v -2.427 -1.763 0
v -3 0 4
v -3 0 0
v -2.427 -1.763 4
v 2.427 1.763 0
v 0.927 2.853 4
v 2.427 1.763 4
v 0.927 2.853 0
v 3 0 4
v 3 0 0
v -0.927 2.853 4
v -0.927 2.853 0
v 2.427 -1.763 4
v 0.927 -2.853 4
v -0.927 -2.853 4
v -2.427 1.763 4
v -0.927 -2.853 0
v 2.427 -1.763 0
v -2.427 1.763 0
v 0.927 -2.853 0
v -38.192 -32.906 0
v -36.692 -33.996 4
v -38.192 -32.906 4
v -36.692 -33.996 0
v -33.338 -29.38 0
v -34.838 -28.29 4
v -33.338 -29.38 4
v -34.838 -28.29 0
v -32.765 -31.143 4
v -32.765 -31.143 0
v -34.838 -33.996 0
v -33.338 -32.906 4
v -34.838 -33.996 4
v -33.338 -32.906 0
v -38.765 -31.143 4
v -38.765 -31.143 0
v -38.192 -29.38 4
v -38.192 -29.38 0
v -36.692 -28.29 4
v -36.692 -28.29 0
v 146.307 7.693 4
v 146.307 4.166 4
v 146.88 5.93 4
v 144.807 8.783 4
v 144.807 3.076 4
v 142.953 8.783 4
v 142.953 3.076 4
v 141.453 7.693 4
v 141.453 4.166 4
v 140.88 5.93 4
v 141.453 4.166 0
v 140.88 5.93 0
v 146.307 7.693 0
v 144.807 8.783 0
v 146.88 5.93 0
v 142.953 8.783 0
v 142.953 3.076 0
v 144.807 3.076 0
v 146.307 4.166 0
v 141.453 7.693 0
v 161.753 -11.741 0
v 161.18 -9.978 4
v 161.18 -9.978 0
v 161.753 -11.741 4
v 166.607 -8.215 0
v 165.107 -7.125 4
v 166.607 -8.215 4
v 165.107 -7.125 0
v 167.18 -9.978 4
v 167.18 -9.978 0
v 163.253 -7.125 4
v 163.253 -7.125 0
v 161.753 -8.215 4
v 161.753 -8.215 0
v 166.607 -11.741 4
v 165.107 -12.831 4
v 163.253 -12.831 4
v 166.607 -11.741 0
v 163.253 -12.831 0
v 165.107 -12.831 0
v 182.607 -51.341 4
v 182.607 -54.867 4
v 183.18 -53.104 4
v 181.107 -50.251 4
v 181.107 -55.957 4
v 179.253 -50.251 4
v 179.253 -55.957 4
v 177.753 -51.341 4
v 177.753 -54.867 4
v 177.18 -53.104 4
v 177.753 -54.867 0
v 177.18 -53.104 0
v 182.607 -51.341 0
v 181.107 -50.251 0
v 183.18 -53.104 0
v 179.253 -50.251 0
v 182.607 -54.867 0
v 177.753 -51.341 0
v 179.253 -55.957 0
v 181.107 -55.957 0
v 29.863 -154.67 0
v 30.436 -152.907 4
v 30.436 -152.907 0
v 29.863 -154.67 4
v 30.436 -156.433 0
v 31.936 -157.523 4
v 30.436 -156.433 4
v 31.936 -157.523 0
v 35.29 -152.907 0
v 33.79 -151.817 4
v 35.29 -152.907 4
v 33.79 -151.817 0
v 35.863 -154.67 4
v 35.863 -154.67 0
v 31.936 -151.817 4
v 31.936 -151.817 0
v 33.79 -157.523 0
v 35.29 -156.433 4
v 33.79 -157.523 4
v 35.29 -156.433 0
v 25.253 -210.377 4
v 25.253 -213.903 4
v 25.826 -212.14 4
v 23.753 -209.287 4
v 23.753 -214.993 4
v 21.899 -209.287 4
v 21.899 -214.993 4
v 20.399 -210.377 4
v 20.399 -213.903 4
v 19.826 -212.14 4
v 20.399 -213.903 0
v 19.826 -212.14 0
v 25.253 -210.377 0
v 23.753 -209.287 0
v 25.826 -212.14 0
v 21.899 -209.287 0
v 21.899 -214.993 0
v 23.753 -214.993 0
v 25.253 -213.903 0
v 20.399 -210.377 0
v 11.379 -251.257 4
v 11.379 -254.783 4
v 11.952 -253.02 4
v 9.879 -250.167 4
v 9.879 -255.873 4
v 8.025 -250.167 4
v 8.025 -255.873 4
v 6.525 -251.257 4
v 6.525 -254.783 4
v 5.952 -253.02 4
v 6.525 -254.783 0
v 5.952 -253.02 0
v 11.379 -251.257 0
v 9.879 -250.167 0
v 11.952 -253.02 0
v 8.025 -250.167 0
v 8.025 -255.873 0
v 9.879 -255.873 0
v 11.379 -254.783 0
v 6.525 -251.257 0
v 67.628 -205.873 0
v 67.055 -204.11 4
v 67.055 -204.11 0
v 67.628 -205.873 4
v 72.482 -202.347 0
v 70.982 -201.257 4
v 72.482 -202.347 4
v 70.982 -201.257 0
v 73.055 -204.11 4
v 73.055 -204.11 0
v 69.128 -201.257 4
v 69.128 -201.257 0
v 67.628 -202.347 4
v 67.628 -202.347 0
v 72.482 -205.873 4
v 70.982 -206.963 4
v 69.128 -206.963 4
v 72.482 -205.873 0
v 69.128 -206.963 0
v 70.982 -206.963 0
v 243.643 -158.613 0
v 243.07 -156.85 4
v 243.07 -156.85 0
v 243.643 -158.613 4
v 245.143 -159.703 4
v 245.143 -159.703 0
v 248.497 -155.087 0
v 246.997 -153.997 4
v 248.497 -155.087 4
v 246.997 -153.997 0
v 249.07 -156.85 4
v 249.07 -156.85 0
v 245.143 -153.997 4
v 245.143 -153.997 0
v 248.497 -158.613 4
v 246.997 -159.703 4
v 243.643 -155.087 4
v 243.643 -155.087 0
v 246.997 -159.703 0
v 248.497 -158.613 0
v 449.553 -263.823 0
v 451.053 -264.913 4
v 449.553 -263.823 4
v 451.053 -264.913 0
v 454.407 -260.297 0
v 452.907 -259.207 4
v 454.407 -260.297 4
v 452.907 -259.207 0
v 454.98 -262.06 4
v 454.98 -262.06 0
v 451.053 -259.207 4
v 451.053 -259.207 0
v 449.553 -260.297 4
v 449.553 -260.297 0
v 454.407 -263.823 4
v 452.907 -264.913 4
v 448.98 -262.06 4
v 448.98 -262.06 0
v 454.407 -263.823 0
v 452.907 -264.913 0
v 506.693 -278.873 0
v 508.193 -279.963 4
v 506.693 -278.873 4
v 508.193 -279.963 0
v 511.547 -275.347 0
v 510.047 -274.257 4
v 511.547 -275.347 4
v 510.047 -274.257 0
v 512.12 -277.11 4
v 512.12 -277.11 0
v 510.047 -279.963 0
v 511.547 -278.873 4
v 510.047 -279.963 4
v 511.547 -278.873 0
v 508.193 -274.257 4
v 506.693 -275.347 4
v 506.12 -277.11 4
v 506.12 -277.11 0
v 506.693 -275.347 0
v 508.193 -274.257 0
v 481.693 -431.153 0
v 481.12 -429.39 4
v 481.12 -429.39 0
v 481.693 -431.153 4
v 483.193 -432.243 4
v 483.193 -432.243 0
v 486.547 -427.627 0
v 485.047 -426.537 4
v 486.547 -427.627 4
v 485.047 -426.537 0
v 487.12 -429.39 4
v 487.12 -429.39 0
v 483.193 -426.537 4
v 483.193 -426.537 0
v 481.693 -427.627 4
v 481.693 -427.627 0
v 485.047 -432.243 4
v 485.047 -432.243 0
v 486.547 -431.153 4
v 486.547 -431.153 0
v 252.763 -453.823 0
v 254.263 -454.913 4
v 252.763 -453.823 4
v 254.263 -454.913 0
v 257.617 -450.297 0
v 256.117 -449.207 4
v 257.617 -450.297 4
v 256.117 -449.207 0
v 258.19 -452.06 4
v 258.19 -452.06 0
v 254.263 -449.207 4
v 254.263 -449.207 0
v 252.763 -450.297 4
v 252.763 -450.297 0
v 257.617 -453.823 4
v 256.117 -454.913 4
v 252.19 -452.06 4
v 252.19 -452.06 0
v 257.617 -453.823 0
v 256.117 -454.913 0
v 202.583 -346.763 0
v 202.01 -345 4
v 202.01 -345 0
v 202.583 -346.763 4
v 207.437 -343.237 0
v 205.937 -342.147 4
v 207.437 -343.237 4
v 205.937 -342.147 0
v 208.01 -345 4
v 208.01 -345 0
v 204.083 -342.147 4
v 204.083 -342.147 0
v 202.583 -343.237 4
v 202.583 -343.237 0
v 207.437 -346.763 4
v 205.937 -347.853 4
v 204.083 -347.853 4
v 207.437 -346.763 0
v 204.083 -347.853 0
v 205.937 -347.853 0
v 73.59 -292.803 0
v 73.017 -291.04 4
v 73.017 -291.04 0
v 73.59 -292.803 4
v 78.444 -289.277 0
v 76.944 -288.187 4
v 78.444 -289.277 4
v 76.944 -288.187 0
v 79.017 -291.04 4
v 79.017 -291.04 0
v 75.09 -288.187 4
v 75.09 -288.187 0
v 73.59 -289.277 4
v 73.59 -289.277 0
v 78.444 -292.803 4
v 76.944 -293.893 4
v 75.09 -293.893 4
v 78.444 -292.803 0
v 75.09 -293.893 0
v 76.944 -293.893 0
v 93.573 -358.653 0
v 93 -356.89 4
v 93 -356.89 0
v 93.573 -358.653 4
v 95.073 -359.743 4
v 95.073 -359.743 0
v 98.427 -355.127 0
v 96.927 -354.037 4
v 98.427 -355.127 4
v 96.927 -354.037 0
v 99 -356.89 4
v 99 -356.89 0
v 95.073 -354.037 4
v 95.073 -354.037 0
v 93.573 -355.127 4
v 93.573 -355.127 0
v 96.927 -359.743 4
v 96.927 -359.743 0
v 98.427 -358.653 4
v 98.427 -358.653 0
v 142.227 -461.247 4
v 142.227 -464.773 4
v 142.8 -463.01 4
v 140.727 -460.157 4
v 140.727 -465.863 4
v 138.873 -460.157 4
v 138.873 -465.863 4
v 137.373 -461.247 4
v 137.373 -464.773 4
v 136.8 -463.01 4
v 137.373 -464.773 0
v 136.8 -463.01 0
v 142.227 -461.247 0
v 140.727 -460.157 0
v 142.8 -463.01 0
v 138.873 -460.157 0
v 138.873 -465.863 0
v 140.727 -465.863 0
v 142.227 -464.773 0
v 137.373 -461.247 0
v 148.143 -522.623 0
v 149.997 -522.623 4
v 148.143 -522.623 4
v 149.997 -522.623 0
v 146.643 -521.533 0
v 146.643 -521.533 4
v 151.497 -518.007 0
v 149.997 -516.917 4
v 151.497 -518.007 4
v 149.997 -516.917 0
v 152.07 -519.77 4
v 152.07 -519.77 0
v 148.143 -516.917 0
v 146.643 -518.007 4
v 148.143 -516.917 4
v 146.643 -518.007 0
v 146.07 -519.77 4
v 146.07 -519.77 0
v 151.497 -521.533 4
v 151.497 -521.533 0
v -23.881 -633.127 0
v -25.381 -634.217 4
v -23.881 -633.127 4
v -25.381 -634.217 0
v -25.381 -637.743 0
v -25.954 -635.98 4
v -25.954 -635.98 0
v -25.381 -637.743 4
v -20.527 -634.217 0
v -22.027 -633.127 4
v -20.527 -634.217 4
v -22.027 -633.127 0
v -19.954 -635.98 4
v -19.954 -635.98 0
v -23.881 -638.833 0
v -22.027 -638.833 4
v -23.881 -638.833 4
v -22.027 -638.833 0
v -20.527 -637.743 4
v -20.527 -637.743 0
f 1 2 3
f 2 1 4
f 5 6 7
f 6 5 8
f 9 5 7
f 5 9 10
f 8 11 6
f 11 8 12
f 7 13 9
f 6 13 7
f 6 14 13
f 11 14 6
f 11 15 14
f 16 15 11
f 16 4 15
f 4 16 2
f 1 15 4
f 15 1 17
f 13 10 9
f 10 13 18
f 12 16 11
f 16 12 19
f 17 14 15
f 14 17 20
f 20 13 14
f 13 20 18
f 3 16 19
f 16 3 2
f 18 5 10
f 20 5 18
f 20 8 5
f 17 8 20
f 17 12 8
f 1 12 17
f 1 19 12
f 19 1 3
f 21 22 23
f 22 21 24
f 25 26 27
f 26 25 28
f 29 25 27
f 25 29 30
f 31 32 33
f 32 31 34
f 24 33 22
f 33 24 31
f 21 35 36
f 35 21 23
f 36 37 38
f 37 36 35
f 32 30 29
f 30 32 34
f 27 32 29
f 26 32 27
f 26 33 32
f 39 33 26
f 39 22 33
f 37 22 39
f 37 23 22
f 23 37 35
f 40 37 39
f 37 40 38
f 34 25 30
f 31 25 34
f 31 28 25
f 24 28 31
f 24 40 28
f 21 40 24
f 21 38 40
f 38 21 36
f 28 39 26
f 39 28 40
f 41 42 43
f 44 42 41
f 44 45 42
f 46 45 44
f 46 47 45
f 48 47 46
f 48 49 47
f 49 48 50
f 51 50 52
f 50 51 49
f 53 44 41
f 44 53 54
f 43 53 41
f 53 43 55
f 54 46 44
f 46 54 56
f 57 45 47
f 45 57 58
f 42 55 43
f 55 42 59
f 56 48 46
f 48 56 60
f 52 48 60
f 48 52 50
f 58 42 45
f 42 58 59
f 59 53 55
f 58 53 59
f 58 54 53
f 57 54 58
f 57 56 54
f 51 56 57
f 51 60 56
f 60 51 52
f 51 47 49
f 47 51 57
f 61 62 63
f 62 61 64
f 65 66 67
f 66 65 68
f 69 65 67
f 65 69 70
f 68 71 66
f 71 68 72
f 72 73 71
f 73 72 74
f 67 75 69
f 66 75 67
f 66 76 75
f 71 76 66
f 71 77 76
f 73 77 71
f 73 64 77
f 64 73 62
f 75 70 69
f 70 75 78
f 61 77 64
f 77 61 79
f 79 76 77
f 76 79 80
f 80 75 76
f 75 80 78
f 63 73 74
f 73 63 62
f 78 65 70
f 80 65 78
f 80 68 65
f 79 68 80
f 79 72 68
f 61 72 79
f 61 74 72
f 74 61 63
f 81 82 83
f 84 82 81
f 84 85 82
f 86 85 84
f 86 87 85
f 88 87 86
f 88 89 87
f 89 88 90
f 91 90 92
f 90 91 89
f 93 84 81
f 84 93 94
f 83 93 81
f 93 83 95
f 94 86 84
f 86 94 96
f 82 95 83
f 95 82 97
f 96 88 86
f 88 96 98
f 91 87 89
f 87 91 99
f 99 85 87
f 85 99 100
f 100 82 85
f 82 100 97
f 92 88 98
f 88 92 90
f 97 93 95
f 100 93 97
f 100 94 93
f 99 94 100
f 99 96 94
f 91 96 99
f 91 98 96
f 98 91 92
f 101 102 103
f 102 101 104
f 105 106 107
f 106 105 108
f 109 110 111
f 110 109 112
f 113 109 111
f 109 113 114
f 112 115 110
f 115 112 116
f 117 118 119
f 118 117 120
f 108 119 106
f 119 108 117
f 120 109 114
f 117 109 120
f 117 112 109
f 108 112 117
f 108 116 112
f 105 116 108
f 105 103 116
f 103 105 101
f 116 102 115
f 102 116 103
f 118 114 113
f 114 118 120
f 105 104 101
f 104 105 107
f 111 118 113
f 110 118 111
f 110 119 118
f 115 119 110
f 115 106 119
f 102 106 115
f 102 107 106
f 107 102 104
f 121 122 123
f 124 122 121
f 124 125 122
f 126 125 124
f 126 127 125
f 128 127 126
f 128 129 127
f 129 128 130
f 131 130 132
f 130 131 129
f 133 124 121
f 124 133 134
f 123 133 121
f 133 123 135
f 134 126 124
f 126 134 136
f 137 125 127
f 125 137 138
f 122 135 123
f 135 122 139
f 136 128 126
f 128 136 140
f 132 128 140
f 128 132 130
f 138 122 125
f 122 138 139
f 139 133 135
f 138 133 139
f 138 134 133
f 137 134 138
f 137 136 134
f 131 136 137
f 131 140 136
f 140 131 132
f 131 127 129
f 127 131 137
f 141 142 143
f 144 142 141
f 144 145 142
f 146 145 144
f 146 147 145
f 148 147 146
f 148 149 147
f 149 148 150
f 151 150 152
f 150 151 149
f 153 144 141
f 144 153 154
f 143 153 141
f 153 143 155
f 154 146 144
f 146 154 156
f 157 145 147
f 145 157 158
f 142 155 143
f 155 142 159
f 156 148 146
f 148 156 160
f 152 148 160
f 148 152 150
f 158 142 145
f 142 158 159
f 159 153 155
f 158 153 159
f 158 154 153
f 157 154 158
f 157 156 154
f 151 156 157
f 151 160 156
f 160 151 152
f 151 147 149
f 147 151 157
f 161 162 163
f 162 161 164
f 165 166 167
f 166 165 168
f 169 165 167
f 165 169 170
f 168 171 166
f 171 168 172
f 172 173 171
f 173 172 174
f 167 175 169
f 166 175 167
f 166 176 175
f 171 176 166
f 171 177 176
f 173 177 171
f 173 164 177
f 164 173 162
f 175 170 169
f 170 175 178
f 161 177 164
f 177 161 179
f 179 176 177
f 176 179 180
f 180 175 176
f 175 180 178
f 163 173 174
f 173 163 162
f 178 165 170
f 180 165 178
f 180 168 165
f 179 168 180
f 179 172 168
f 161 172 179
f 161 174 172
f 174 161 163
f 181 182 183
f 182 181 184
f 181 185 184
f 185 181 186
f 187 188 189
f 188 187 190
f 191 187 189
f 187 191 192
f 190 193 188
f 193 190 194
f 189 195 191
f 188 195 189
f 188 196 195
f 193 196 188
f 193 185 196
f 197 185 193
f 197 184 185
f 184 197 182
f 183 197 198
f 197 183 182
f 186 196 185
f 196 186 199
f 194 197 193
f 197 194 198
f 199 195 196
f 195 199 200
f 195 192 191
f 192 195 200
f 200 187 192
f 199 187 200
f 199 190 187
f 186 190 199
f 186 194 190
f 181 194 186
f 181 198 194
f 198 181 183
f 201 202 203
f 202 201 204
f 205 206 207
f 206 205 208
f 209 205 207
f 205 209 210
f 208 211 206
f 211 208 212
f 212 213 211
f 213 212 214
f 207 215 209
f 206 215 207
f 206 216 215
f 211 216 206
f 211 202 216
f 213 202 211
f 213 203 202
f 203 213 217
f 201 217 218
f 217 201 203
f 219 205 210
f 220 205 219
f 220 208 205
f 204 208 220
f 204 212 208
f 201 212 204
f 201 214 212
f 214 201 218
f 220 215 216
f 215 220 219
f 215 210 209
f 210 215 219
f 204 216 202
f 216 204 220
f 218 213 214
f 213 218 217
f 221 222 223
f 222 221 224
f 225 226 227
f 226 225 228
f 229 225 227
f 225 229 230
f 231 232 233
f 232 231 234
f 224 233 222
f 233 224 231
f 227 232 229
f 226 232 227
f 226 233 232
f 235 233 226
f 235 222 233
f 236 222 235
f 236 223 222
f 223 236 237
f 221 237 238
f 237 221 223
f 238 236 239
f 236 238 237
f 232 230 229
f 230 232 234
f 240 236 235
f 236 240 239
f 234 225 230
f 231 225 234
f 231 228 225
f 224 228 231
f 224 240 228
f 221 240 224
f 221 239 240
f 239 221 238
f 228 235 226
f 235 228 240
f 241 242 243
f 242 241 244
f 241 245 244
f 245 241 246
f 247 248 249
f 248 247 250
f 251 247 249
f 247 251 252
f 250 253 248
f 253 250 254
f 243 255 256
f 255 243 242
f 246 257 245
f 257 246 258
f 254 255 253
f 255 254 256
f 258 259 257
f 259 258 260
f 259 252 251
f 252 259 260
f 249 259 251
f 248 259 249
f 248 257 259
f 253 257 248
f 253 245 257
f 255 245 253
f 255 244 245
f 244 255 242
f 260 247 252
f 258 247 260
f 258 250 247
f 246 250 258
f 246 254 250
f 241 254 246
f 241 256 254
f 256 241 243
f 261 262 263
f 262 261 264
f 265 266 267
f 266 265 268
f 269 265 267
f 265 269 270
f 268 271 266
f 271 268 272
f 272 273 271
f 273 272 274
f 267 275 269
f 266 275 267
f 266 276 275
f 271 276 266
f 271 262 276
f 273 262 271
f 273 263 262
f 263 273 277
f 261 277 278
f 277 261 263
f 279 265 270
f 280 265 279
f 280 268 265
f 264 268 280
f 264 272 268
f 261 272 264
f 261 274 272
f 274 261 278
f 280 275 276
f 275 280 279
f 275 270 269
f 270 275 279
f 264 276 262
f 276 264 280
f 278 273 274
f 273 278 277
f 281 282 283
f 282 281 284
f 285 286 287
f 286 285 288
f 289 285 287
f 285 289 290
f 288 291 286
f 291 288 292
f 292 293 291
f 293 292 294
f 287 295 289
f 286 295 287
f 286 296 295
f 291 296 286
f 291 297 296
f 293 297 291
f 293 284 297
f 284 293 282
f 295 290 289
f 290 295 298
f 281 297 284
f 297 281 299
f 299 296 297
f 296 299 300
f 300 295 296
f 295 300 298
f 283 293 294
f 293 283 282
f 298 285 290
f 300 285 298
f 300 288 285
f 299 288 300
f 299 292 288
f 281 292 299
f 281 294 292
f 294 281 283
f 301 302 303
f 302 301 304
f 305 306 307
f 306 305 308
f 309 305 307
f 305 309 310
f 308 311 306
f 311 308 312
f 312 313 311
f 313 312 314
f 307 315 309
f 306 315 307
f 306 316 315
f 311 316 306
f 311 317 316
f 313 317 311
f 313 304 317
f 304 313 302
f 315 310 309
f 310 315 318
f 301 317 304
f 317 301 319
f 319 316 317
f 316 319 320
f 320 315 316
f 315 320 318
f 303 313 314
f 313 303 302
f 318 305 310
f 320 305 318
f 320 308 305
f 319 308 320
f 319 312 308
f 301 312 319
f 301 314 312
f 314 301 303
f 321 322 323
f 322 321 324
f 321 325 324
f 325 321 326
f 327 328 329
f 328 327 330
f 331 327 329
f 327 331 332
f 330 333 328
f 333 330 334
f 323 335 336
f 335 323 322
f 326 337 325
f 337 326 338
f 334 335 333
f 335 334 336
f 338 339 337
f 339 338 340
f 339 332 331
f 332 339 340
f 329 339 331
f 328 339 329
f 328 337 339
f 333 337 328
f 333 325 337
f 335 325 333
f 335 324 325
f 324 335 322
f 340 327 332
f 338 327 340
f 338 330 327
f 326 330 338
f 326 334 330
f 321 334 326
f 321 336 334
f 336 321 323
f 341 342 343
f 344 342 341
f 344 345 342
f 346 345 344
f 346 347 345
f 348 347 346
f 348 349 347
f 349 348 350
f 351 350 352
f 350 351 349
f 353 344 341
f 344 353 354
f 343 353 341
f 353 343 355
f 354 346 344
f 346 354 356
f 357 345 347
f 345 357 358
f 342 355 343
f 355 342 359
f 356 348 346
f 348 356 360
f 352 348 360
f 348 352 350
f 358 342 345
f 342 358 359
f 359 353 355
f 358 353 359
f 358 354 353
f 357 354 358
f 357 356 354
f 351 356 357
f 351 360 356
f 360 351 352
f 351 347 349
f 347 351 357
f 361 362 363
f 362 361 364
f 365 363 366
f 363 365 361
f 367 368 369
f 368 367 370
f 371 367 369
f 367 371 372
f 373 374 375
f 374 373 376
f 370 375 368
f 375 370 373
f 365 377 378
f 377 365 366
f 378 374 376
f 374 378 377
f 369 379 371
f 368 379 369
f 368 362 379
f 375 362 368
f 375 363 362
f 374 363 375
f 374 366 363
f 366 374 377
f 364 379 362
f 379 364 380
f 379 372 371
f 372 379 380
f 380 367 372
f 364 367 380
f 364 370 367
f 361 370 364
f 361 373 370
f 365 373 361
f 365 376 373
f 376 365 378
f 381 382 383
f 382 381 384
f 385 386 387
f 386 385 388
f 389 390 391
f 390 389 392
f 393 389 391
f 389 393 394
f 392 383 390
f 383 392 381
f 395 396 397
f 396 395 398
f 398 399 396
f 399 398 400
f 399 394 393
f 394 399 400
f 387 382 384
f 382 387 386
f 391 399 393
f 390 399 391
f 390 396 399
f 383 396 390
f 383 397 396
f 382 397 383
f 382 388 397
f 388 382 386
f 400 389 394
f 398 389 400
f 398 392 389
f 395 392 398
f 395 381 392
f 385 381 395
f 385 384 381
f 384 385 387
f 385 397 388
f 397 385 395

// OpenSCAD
module manhattan45voronoi(points, infinity=100, gap_size=1) 
{
	t = gap_size/2;
	s = t*tan(22.5);

	for(p0 = points)	//each point
	{
		translate(p0)
		intersection_for(p1 = points)	//check every neighbor
		{
			v = p1-p0;	//vector from p0 to p1
			mp = v/2;	//mid-point
			narrow2 = min([abs(mp[0]),abs(mp[1])]);	//half the narrower side
			ne = mp + [ narrow2	, narrow2];
			nw = mp + [-narrow2	, narrow2];
			sw = mp + [-narrow2	,-narrow2];
			se = mp + [ narrow2	,-narrow2];
			/*	-->  <	narrow2
				nw  ne
				  mp
				sw  se
				>  <--	narrow2
			 */
			//Lee 1980 Two-Dimensional Voronoi Diagrams in the Lp-Metric (Figure1)
			if		(mp[0]==0 &&	mp[1]==0)	//pts same
			{
			}
			else if	(mp[0] >0 &&	mp[1]==0)	//along x+
			{
				polygon([	[-infinity, infinity],
							[mp[0] - t, infinity],
							[mp[0] - t,-infinity],
							[-infinity,-infinity]]);
			}
			else if	(mp[0] >0 &&	mp[1] >0 &&	abs(mp[0]) >abs(mp[1]))	//octant 1
			{
				polygon([	//clockwise
					[se[0] - t,se[1] - s],
					[se[0] - t,-infinity],
					[-infinity,-infinity],
					[-infinity, infinity],
					[nw[0] - t, infinity],
					[nw[0] - t,nw[1] - s]
				]);
			}
			else if	(mp[0] >0 &&	mp[1] >0 &&	abs(mp[0])==abs(mp[1]))	//diag  NE
			{
				translate(mp)	rotate([0,0, 45])	translate([-infinity,-infinity])
					square([infinity-t,infinity*2]);
			}
			else if	(mp[0] >0 &&	mp[1] >0 &&	abs(mp[0])< abs(mp[1]))	//octant 2
			{
				polygon([	//clockwise
					[se[0] - s,se[1] - t],
					[ infinity,se[1] - t],
					[ infinity,-infinity],
					[-infinity,-infinity],
					[-infinity,nw[1] - t],
					[nw[0] - s,nw[1] - t]
				]);
			}
			else if	(mp[0]==0 &&	mp[1] >0)	//along y+
			{
				polygon([	[-infinity,mp[1] - t],
							[ infinity,mp[1] - t],
							[ infinity,-infinity],
							[-infinity,-infinity]]);
			}
			else if	(mp[0]< 0 &&	mp[1] >0 &&	abs(mp[0])< abs(mp[1]))	//octant 3
			{
				polygon([	//clockwise
					[ne[0] + s,ne[1] - t],
					[ infinity,ne[1] - t],
					[ infinity,-infinity],
					[-infinity,-infinity],
					[-infinity,sw[1] - t],
					[sw[0] + s,sw[1] - t]
				]);
			}
			else if	(mp[0]< 0 &&	mp[1] >0 &&	abs(mp[0])==abs(mp[1]))	//diag  NW
			{
				translate(mp)	rotate([0,0,135])	translate([-infinity,-infinity])
					square([infinity-t,infinity*2]);
			}
			else if	(mp[0]< 0 &&	mp[1] >0 &&	abs(mp[0]) >abs(mp[1]))	//octant 4
			{
				polygon([	//clockwise
					[ne[0] + t,ne[1] - s],
					[ne[0] + t, infinity],
					[ infinity, infinity],
					[ infinity,-infinity],
					[sw[0] + t,-infinity],
					[sw[0] + t,sw[1] - s]
				]);
			}
			else if	(mp[0]< 0 &&	mp[1]==0)	//along x-
			{
				polygon([	[ infinity,-infinity],
							[mp[0] + t,-infinity],
							[mp[0] + t, infinity],
							[ infinity, infinity]]);
			}
			else if	(mp[0]< 0 &&	mp[1]< 0 &&	abs(mp[0]) >abs(mp[1]))	//octant 5
			{
				polygon([	//clockwise
					[nw[0] + t,nw[1] + s],
					[nw[0] + t, infinity],
					[ infinity, infinity],
					[ infinity,-infinity],
					[se[0] + t,-infinity],
					[se[0] + t,se[1] + s]
				]);
			}
			else if	(mp[0]< 0 &&	mp[1]< 0 &&	abs(mp[0])==abs(mp[1]))	//diag  SW
			{
				translate(mp)	rotate([0,0,225])	translate([-infinity,-infinity])
					square([infinity-t,infinity*2]);
			}
			else if	(mp[0]< 0 &&	mp[1]< 0 &&	abs(mp[0])< abs(mp[1]))	//octant 6
			{
				polygon([	//clockwise
					[nw[0] + s,nw[1] + t],
					[-infinity,nw[1] + t],
					[-infinity, infinity],
					[ infinity, infinity],
					[ infinity,se[1] + t],
					[se[0] + s,se[1] + t]
				]);
			}
			else if	(mp[0]==0 &&	mp[1]< 0)	//along y-
			{
				polygon([	[-infinity, infinity],
							[-infinity,mp[1] + t],
							[ infinity,mp[1] + t],
							[ infinity, infinity]]);
			}
			else if	(mp[0] >0 &&	mp[1]< 0 &&	abs(mp[0])< abs(mp[1]))	//octant 7
			{
				polygon([	//clockwise
					[sw[0] - s,sw[1] + t],
					[-infinity,sw[1] + t],
					[-infinity, infinity],
					[ infinity, infinity],
					[ infinity,ne[1] + t],
					[ne[0] - s,ne[1] + t]
				]);
			}
			else if	(mp[0] >0 &&	mp[1]< 0 &&	abs(mp[0])==abs(mp[1]))	//diag  SE
			{
				translate(mp)	rotate([0,0,315])	translate([-infinity,-infinity])
					square([infinity-t,infinity*2]);
			}
			else if	(mp[0] >0 &&	mp[1]< 0 &&	abs(mp[0]) >abs(mp[1]))	//octant 8
			{
				polygon([	//clockwise
					[sw[0] - t,sw[1] + s],
					[sw[0] - t,-infinity],
					[-infinity,-infinity],
					[-infinity, infinity],
					[ne[0] - t, infinity],
					[ne[0] - t,ne[1] + s]
				]);
			}
		}
	}
//	manhattan45voronoi is licensed under
//	MIT License
//
//	Copyright (c) 2023 DrT0M
//
//	Permission is hereby granted, free of charge, to any person obtaining a copy
//	of this software and associated documentation files (the "Software"), to deal
//	in the Software without restriction, including without limitation the rights
//	to use, copy, modify, merge, publish, distribute, sublicense, and/or sell
//	copies of the Software, and to permit persons to whom the Software is
//	furnished to do so, subject to the following conditions:
//	
//	The above copyright notice and this permission notice shall be included in all
//	copies or substantial portions of the Software.
//
//	THE SOFTWARE IS PROVIDED "AS IS", WITHOUT WARRANTY OF ANY KIND, EXPRESS OR
//	IMPLIED, INCLUDING BUT NOT LIMITED TO THE WARRANTIES OF MERCHANTABILITY,
//	FITNESS FOR A PARTICULAR PURPOSE AND NONINFRINGEMENT. IN NO EVENT SHALL THE
//	AUTHORS OR COPYRIGHT HOLDERS BE LIABLE FOR ANY CLAIM, DAMAGES OR OTHER
//	LIABILITY, WHETHER IN AN ACTION OF CONTRACT, TORT OR OTHERWISE, ARISING FROM,
//	OUT OF OR IN CONNECTION WITH THE SOFTWARE OR THE USE OR OTHER DEALINGS IN THE
//	SOFTWARE.
}

points=[
	[0,0],
	[-35.765,-1*31.143],
	[143.88,-1*-5.9296],
	[164.18,-1*9.9779],
	[180.18,-1*53.104],
	[32.863,-1*154.67],
	[22.826,-1*212.14],
	[8.9523,-1*253.02],
	[70.055,-1*204.11],
	[246.07,-1*156.85],
	[451.98,-1*262.06],
	[509.12,-1*277.11],
	[484.12,-1*429.39],
	[255.19,-1*452.06],
	[205.01,-1*345],
	[76.017,-1*291.04],
	[96,-1*356.89],
	[139.8,-1*463.01],
	[149.07,-1*519.77],
	[-22.954,-1*635.98]
];//https://en.wikipedia.org/wiki/File:Manhattan_Voronoi_Diagram.svg
//matches with 
//test_Manhattan45Voronoi_Diagram.png
//generated by
manhattan45voronoi(points, infinity=700, gap_size=4);
for(p=[0:len(points)-1])	translate(points[p]) color("black") cylinder(h=4,r=3);	//mark the points
//tab stop @ 4
